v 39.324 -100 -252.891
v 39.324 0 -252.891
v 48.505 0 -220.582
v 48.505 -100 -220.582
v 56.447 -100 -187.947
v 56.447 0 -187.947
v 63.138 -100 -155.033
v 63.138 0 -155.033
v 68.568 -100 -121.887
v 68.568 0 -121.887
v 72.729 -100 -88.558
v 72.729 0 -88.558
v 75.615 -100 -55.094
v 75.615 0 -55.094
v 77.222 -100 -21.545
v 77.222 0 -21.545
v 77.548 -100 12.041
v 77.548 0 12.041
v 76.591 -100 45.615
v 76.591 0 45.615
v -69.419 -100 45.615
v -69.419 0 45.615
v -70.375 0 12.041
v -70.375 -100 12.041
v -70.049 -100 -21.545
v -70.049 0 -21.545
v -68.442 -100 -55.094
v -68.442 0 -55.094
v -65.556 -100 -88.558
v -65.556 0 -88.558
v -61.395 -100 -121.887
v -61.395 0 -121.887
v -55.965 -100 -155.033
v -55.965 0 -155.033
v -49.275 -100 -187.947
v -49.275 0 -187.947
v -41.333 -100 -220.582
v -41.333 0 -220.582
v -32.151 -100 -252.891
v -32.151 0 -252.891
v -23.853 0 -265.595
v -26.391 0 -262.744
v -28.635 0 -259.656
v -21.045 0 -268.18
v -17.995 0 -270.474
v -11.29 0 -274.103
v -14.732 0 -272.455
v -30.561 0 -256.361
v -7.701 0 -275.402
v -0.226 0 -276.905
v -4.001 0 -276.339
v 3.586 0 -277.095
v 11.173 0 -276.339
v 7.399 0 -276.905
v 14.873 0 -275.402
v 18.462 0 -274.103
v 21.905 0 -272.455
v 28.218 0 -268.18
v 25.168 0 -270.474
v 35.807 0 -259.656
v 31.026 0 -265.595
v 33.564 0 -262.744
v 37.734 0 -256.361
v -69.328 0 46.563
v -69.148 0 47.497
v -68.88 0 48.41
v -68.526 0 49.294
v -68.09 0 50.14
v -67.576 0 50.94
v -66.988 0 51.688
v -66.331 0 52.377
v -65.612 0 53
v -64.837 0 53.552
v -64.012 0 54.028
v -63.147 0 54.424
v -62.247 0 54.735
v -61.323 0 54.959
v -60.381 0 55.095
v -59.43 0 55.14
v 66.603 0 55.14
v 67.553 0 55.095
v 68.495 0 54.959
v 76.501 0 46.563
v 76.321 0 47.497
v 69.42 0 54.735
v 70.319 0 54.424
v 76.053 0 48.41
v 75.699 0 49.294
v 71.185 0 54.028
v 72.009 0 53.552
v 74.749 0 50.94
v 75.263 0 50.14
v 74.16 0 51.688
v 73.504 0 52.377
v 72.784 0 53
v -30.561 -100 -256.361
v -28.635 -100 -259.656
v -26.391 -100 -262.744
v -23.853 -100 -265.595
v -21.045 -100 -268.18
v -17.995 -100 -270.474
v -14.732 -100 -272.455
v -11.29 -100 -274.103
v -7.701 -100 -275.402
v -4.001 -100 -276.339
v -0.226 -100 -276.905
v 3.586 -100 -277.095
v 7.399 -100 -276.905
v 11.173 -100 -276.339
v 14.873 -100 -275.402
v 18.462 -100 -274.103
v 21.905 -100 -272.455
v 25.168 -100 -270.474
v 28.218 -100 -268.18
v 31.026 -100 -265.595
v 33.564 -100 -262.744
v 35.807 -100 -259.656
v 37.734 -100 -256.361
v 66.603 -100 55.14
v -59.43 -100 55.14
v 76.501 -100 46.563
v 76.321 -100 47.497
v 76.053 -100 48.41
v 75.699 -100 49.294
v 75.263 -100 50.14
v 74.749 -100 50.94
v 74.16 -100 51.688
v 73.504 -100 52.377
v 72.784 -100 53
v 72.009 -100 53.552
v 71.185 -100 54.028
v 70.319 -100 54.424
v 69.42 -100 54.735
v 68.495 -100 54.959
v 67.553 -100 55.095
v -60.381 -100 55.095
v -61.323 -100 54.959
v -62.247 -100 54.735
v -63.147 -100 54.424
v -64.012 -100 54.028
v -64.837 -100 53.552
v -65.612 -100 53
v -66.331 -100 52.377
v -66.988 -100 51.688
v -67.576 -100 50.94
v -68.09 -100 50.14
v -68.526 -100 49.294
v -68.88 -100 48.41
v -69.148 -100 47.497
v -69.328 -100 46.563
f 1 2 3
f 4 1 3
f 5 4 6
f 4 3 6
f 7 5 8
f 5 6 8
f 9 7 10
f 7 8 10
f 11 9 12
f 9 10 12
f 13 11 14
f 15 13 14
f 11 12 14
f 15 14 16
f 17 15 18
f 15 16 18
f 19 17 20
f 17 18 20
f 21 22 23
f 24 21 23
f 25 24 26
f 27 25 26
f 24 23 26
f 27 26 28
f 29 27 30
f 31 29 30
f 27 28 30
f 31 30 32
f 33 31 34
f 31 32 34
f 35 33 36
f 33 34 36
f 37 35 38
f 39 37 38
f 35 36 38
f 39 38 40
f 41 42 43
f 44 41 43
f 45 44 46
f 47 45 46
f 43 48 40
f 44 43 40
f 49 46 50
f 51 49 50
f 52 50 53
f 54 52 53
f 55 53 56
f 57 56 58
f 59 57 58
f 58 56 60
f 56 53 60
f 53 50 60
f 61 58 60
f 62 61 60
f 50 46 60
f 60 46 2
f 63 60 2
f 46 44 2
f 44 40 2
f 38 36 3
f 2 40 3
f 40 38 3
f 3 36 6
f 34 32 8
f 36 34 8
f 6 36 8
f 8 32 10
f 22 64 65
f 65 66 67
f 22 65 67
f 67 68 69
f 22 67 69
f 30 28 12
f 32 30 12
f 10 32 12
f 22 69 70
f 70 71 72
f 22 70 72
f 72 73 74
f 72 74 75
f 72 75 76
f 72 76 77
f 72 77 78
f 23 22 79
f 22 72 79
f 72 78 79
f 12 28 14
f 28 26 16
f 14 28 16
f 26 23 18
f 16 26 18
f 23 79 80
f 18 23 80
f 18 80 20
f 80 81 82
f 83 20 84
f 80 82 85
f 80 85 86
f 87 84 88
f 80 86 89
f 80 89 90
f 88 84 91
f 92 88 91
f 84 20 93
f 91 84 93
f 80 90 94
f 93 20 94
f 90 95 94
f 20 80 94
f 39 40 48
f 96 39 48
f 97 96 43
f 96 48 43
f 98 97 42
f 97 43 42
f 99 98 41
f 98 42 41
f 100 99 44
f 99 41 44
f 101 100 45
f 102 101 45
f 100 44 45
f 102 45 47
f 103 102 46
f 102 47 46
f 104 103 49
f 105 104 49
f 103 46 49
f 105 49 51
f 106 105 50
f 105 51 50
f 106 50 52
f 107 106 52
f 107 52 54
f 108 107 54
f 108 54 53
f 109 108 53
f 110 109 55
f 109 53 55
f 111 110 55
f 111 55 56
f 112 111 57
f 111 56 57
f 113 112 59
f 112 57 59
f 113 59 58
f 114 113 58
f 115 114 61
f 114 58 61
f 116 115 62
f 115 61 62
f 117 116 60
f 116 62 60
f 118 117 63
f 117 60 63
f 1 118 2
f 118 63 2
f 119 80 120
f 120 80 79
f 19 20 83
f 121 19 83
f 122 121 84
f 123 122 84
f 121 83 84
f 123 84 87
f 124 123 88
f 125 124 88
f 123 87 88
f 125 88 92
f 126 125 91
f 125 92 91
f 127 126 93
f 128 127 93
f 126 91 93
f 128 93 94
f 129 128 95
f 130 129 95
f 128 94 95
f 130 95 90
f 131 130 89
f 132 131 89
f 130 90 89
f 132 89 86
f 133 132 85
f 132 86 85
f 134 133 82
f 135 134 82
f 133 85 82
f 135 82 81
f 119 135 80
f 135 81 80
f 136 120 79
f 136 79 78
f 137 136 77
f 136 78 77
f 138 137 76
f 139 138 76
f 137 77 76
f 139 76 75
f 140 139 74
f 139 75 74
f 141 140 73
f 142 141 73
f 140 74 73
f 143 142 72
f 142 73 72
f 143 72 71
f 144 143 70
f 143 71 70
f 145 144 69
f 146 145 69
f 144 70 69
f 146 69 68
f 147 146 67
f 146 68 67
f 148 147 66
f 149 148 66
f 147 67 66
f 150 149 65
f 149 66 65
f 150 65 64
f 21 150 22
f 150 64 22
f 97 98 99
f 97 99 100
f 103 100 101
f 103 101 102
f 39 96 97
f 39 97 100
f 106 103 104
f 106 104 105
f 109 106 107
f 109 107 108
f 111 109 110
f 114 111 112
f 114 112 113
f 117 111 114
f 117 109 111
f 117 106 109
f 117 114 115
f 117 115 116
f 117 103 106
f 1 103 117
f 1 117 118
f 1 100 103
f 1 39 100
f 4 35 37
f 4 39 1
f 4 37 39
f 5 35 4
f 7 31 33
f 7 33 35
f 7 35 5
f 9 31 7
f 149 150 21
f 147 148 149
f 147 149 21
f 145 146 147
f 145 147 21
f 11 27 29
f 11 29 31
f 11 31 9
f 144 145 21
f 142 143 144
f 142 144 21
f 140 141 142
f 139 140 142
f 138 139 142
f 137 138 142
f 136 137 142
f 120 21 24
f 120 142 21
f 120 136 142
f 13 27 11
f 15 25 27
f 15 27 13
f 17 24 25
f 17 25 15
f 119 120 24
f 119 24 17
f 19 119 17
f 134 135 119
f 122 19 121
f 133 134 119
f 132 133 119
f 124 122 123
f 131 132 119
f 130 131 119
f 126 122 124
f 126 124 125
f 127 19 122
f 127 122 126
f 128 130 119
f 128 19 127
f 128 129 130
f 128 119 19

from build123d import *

# Parameters (mm, degrees)
F1_DEPTH = 100


with BuildPart() as f1:
    # F0 (on Front) → F1 (new body)
    with BuildSketch(Plane.XZ):
        with BuildLine():
            Line((66.602687, 55.139948), (-59.430013, 55.139948))
            ThreePointArc((-59.430013, 55.139948), (-66.330961, 52.377138), (-69.418707, 45.615332))
            ThreePointArc((-69.418707, 45.615332), (-63.634498, -105.241982), (-32.151404, -252.890894))
            ThreePointArc((-32.151404, -252.890894), (3.586337, -277.094579), (39.324078, -252.890894))
            ThreePointArc((39.324078, -252.890894), (70.807172, -105.241982), (76.591381, 45.615332))
            ThreePointArc((76.591381, 45.615332), (73.503635, 52.377138), (66.602687, 55.139948))
        make_face()
    extrude(amount=F1_DEPTH)


solid = f1.part
